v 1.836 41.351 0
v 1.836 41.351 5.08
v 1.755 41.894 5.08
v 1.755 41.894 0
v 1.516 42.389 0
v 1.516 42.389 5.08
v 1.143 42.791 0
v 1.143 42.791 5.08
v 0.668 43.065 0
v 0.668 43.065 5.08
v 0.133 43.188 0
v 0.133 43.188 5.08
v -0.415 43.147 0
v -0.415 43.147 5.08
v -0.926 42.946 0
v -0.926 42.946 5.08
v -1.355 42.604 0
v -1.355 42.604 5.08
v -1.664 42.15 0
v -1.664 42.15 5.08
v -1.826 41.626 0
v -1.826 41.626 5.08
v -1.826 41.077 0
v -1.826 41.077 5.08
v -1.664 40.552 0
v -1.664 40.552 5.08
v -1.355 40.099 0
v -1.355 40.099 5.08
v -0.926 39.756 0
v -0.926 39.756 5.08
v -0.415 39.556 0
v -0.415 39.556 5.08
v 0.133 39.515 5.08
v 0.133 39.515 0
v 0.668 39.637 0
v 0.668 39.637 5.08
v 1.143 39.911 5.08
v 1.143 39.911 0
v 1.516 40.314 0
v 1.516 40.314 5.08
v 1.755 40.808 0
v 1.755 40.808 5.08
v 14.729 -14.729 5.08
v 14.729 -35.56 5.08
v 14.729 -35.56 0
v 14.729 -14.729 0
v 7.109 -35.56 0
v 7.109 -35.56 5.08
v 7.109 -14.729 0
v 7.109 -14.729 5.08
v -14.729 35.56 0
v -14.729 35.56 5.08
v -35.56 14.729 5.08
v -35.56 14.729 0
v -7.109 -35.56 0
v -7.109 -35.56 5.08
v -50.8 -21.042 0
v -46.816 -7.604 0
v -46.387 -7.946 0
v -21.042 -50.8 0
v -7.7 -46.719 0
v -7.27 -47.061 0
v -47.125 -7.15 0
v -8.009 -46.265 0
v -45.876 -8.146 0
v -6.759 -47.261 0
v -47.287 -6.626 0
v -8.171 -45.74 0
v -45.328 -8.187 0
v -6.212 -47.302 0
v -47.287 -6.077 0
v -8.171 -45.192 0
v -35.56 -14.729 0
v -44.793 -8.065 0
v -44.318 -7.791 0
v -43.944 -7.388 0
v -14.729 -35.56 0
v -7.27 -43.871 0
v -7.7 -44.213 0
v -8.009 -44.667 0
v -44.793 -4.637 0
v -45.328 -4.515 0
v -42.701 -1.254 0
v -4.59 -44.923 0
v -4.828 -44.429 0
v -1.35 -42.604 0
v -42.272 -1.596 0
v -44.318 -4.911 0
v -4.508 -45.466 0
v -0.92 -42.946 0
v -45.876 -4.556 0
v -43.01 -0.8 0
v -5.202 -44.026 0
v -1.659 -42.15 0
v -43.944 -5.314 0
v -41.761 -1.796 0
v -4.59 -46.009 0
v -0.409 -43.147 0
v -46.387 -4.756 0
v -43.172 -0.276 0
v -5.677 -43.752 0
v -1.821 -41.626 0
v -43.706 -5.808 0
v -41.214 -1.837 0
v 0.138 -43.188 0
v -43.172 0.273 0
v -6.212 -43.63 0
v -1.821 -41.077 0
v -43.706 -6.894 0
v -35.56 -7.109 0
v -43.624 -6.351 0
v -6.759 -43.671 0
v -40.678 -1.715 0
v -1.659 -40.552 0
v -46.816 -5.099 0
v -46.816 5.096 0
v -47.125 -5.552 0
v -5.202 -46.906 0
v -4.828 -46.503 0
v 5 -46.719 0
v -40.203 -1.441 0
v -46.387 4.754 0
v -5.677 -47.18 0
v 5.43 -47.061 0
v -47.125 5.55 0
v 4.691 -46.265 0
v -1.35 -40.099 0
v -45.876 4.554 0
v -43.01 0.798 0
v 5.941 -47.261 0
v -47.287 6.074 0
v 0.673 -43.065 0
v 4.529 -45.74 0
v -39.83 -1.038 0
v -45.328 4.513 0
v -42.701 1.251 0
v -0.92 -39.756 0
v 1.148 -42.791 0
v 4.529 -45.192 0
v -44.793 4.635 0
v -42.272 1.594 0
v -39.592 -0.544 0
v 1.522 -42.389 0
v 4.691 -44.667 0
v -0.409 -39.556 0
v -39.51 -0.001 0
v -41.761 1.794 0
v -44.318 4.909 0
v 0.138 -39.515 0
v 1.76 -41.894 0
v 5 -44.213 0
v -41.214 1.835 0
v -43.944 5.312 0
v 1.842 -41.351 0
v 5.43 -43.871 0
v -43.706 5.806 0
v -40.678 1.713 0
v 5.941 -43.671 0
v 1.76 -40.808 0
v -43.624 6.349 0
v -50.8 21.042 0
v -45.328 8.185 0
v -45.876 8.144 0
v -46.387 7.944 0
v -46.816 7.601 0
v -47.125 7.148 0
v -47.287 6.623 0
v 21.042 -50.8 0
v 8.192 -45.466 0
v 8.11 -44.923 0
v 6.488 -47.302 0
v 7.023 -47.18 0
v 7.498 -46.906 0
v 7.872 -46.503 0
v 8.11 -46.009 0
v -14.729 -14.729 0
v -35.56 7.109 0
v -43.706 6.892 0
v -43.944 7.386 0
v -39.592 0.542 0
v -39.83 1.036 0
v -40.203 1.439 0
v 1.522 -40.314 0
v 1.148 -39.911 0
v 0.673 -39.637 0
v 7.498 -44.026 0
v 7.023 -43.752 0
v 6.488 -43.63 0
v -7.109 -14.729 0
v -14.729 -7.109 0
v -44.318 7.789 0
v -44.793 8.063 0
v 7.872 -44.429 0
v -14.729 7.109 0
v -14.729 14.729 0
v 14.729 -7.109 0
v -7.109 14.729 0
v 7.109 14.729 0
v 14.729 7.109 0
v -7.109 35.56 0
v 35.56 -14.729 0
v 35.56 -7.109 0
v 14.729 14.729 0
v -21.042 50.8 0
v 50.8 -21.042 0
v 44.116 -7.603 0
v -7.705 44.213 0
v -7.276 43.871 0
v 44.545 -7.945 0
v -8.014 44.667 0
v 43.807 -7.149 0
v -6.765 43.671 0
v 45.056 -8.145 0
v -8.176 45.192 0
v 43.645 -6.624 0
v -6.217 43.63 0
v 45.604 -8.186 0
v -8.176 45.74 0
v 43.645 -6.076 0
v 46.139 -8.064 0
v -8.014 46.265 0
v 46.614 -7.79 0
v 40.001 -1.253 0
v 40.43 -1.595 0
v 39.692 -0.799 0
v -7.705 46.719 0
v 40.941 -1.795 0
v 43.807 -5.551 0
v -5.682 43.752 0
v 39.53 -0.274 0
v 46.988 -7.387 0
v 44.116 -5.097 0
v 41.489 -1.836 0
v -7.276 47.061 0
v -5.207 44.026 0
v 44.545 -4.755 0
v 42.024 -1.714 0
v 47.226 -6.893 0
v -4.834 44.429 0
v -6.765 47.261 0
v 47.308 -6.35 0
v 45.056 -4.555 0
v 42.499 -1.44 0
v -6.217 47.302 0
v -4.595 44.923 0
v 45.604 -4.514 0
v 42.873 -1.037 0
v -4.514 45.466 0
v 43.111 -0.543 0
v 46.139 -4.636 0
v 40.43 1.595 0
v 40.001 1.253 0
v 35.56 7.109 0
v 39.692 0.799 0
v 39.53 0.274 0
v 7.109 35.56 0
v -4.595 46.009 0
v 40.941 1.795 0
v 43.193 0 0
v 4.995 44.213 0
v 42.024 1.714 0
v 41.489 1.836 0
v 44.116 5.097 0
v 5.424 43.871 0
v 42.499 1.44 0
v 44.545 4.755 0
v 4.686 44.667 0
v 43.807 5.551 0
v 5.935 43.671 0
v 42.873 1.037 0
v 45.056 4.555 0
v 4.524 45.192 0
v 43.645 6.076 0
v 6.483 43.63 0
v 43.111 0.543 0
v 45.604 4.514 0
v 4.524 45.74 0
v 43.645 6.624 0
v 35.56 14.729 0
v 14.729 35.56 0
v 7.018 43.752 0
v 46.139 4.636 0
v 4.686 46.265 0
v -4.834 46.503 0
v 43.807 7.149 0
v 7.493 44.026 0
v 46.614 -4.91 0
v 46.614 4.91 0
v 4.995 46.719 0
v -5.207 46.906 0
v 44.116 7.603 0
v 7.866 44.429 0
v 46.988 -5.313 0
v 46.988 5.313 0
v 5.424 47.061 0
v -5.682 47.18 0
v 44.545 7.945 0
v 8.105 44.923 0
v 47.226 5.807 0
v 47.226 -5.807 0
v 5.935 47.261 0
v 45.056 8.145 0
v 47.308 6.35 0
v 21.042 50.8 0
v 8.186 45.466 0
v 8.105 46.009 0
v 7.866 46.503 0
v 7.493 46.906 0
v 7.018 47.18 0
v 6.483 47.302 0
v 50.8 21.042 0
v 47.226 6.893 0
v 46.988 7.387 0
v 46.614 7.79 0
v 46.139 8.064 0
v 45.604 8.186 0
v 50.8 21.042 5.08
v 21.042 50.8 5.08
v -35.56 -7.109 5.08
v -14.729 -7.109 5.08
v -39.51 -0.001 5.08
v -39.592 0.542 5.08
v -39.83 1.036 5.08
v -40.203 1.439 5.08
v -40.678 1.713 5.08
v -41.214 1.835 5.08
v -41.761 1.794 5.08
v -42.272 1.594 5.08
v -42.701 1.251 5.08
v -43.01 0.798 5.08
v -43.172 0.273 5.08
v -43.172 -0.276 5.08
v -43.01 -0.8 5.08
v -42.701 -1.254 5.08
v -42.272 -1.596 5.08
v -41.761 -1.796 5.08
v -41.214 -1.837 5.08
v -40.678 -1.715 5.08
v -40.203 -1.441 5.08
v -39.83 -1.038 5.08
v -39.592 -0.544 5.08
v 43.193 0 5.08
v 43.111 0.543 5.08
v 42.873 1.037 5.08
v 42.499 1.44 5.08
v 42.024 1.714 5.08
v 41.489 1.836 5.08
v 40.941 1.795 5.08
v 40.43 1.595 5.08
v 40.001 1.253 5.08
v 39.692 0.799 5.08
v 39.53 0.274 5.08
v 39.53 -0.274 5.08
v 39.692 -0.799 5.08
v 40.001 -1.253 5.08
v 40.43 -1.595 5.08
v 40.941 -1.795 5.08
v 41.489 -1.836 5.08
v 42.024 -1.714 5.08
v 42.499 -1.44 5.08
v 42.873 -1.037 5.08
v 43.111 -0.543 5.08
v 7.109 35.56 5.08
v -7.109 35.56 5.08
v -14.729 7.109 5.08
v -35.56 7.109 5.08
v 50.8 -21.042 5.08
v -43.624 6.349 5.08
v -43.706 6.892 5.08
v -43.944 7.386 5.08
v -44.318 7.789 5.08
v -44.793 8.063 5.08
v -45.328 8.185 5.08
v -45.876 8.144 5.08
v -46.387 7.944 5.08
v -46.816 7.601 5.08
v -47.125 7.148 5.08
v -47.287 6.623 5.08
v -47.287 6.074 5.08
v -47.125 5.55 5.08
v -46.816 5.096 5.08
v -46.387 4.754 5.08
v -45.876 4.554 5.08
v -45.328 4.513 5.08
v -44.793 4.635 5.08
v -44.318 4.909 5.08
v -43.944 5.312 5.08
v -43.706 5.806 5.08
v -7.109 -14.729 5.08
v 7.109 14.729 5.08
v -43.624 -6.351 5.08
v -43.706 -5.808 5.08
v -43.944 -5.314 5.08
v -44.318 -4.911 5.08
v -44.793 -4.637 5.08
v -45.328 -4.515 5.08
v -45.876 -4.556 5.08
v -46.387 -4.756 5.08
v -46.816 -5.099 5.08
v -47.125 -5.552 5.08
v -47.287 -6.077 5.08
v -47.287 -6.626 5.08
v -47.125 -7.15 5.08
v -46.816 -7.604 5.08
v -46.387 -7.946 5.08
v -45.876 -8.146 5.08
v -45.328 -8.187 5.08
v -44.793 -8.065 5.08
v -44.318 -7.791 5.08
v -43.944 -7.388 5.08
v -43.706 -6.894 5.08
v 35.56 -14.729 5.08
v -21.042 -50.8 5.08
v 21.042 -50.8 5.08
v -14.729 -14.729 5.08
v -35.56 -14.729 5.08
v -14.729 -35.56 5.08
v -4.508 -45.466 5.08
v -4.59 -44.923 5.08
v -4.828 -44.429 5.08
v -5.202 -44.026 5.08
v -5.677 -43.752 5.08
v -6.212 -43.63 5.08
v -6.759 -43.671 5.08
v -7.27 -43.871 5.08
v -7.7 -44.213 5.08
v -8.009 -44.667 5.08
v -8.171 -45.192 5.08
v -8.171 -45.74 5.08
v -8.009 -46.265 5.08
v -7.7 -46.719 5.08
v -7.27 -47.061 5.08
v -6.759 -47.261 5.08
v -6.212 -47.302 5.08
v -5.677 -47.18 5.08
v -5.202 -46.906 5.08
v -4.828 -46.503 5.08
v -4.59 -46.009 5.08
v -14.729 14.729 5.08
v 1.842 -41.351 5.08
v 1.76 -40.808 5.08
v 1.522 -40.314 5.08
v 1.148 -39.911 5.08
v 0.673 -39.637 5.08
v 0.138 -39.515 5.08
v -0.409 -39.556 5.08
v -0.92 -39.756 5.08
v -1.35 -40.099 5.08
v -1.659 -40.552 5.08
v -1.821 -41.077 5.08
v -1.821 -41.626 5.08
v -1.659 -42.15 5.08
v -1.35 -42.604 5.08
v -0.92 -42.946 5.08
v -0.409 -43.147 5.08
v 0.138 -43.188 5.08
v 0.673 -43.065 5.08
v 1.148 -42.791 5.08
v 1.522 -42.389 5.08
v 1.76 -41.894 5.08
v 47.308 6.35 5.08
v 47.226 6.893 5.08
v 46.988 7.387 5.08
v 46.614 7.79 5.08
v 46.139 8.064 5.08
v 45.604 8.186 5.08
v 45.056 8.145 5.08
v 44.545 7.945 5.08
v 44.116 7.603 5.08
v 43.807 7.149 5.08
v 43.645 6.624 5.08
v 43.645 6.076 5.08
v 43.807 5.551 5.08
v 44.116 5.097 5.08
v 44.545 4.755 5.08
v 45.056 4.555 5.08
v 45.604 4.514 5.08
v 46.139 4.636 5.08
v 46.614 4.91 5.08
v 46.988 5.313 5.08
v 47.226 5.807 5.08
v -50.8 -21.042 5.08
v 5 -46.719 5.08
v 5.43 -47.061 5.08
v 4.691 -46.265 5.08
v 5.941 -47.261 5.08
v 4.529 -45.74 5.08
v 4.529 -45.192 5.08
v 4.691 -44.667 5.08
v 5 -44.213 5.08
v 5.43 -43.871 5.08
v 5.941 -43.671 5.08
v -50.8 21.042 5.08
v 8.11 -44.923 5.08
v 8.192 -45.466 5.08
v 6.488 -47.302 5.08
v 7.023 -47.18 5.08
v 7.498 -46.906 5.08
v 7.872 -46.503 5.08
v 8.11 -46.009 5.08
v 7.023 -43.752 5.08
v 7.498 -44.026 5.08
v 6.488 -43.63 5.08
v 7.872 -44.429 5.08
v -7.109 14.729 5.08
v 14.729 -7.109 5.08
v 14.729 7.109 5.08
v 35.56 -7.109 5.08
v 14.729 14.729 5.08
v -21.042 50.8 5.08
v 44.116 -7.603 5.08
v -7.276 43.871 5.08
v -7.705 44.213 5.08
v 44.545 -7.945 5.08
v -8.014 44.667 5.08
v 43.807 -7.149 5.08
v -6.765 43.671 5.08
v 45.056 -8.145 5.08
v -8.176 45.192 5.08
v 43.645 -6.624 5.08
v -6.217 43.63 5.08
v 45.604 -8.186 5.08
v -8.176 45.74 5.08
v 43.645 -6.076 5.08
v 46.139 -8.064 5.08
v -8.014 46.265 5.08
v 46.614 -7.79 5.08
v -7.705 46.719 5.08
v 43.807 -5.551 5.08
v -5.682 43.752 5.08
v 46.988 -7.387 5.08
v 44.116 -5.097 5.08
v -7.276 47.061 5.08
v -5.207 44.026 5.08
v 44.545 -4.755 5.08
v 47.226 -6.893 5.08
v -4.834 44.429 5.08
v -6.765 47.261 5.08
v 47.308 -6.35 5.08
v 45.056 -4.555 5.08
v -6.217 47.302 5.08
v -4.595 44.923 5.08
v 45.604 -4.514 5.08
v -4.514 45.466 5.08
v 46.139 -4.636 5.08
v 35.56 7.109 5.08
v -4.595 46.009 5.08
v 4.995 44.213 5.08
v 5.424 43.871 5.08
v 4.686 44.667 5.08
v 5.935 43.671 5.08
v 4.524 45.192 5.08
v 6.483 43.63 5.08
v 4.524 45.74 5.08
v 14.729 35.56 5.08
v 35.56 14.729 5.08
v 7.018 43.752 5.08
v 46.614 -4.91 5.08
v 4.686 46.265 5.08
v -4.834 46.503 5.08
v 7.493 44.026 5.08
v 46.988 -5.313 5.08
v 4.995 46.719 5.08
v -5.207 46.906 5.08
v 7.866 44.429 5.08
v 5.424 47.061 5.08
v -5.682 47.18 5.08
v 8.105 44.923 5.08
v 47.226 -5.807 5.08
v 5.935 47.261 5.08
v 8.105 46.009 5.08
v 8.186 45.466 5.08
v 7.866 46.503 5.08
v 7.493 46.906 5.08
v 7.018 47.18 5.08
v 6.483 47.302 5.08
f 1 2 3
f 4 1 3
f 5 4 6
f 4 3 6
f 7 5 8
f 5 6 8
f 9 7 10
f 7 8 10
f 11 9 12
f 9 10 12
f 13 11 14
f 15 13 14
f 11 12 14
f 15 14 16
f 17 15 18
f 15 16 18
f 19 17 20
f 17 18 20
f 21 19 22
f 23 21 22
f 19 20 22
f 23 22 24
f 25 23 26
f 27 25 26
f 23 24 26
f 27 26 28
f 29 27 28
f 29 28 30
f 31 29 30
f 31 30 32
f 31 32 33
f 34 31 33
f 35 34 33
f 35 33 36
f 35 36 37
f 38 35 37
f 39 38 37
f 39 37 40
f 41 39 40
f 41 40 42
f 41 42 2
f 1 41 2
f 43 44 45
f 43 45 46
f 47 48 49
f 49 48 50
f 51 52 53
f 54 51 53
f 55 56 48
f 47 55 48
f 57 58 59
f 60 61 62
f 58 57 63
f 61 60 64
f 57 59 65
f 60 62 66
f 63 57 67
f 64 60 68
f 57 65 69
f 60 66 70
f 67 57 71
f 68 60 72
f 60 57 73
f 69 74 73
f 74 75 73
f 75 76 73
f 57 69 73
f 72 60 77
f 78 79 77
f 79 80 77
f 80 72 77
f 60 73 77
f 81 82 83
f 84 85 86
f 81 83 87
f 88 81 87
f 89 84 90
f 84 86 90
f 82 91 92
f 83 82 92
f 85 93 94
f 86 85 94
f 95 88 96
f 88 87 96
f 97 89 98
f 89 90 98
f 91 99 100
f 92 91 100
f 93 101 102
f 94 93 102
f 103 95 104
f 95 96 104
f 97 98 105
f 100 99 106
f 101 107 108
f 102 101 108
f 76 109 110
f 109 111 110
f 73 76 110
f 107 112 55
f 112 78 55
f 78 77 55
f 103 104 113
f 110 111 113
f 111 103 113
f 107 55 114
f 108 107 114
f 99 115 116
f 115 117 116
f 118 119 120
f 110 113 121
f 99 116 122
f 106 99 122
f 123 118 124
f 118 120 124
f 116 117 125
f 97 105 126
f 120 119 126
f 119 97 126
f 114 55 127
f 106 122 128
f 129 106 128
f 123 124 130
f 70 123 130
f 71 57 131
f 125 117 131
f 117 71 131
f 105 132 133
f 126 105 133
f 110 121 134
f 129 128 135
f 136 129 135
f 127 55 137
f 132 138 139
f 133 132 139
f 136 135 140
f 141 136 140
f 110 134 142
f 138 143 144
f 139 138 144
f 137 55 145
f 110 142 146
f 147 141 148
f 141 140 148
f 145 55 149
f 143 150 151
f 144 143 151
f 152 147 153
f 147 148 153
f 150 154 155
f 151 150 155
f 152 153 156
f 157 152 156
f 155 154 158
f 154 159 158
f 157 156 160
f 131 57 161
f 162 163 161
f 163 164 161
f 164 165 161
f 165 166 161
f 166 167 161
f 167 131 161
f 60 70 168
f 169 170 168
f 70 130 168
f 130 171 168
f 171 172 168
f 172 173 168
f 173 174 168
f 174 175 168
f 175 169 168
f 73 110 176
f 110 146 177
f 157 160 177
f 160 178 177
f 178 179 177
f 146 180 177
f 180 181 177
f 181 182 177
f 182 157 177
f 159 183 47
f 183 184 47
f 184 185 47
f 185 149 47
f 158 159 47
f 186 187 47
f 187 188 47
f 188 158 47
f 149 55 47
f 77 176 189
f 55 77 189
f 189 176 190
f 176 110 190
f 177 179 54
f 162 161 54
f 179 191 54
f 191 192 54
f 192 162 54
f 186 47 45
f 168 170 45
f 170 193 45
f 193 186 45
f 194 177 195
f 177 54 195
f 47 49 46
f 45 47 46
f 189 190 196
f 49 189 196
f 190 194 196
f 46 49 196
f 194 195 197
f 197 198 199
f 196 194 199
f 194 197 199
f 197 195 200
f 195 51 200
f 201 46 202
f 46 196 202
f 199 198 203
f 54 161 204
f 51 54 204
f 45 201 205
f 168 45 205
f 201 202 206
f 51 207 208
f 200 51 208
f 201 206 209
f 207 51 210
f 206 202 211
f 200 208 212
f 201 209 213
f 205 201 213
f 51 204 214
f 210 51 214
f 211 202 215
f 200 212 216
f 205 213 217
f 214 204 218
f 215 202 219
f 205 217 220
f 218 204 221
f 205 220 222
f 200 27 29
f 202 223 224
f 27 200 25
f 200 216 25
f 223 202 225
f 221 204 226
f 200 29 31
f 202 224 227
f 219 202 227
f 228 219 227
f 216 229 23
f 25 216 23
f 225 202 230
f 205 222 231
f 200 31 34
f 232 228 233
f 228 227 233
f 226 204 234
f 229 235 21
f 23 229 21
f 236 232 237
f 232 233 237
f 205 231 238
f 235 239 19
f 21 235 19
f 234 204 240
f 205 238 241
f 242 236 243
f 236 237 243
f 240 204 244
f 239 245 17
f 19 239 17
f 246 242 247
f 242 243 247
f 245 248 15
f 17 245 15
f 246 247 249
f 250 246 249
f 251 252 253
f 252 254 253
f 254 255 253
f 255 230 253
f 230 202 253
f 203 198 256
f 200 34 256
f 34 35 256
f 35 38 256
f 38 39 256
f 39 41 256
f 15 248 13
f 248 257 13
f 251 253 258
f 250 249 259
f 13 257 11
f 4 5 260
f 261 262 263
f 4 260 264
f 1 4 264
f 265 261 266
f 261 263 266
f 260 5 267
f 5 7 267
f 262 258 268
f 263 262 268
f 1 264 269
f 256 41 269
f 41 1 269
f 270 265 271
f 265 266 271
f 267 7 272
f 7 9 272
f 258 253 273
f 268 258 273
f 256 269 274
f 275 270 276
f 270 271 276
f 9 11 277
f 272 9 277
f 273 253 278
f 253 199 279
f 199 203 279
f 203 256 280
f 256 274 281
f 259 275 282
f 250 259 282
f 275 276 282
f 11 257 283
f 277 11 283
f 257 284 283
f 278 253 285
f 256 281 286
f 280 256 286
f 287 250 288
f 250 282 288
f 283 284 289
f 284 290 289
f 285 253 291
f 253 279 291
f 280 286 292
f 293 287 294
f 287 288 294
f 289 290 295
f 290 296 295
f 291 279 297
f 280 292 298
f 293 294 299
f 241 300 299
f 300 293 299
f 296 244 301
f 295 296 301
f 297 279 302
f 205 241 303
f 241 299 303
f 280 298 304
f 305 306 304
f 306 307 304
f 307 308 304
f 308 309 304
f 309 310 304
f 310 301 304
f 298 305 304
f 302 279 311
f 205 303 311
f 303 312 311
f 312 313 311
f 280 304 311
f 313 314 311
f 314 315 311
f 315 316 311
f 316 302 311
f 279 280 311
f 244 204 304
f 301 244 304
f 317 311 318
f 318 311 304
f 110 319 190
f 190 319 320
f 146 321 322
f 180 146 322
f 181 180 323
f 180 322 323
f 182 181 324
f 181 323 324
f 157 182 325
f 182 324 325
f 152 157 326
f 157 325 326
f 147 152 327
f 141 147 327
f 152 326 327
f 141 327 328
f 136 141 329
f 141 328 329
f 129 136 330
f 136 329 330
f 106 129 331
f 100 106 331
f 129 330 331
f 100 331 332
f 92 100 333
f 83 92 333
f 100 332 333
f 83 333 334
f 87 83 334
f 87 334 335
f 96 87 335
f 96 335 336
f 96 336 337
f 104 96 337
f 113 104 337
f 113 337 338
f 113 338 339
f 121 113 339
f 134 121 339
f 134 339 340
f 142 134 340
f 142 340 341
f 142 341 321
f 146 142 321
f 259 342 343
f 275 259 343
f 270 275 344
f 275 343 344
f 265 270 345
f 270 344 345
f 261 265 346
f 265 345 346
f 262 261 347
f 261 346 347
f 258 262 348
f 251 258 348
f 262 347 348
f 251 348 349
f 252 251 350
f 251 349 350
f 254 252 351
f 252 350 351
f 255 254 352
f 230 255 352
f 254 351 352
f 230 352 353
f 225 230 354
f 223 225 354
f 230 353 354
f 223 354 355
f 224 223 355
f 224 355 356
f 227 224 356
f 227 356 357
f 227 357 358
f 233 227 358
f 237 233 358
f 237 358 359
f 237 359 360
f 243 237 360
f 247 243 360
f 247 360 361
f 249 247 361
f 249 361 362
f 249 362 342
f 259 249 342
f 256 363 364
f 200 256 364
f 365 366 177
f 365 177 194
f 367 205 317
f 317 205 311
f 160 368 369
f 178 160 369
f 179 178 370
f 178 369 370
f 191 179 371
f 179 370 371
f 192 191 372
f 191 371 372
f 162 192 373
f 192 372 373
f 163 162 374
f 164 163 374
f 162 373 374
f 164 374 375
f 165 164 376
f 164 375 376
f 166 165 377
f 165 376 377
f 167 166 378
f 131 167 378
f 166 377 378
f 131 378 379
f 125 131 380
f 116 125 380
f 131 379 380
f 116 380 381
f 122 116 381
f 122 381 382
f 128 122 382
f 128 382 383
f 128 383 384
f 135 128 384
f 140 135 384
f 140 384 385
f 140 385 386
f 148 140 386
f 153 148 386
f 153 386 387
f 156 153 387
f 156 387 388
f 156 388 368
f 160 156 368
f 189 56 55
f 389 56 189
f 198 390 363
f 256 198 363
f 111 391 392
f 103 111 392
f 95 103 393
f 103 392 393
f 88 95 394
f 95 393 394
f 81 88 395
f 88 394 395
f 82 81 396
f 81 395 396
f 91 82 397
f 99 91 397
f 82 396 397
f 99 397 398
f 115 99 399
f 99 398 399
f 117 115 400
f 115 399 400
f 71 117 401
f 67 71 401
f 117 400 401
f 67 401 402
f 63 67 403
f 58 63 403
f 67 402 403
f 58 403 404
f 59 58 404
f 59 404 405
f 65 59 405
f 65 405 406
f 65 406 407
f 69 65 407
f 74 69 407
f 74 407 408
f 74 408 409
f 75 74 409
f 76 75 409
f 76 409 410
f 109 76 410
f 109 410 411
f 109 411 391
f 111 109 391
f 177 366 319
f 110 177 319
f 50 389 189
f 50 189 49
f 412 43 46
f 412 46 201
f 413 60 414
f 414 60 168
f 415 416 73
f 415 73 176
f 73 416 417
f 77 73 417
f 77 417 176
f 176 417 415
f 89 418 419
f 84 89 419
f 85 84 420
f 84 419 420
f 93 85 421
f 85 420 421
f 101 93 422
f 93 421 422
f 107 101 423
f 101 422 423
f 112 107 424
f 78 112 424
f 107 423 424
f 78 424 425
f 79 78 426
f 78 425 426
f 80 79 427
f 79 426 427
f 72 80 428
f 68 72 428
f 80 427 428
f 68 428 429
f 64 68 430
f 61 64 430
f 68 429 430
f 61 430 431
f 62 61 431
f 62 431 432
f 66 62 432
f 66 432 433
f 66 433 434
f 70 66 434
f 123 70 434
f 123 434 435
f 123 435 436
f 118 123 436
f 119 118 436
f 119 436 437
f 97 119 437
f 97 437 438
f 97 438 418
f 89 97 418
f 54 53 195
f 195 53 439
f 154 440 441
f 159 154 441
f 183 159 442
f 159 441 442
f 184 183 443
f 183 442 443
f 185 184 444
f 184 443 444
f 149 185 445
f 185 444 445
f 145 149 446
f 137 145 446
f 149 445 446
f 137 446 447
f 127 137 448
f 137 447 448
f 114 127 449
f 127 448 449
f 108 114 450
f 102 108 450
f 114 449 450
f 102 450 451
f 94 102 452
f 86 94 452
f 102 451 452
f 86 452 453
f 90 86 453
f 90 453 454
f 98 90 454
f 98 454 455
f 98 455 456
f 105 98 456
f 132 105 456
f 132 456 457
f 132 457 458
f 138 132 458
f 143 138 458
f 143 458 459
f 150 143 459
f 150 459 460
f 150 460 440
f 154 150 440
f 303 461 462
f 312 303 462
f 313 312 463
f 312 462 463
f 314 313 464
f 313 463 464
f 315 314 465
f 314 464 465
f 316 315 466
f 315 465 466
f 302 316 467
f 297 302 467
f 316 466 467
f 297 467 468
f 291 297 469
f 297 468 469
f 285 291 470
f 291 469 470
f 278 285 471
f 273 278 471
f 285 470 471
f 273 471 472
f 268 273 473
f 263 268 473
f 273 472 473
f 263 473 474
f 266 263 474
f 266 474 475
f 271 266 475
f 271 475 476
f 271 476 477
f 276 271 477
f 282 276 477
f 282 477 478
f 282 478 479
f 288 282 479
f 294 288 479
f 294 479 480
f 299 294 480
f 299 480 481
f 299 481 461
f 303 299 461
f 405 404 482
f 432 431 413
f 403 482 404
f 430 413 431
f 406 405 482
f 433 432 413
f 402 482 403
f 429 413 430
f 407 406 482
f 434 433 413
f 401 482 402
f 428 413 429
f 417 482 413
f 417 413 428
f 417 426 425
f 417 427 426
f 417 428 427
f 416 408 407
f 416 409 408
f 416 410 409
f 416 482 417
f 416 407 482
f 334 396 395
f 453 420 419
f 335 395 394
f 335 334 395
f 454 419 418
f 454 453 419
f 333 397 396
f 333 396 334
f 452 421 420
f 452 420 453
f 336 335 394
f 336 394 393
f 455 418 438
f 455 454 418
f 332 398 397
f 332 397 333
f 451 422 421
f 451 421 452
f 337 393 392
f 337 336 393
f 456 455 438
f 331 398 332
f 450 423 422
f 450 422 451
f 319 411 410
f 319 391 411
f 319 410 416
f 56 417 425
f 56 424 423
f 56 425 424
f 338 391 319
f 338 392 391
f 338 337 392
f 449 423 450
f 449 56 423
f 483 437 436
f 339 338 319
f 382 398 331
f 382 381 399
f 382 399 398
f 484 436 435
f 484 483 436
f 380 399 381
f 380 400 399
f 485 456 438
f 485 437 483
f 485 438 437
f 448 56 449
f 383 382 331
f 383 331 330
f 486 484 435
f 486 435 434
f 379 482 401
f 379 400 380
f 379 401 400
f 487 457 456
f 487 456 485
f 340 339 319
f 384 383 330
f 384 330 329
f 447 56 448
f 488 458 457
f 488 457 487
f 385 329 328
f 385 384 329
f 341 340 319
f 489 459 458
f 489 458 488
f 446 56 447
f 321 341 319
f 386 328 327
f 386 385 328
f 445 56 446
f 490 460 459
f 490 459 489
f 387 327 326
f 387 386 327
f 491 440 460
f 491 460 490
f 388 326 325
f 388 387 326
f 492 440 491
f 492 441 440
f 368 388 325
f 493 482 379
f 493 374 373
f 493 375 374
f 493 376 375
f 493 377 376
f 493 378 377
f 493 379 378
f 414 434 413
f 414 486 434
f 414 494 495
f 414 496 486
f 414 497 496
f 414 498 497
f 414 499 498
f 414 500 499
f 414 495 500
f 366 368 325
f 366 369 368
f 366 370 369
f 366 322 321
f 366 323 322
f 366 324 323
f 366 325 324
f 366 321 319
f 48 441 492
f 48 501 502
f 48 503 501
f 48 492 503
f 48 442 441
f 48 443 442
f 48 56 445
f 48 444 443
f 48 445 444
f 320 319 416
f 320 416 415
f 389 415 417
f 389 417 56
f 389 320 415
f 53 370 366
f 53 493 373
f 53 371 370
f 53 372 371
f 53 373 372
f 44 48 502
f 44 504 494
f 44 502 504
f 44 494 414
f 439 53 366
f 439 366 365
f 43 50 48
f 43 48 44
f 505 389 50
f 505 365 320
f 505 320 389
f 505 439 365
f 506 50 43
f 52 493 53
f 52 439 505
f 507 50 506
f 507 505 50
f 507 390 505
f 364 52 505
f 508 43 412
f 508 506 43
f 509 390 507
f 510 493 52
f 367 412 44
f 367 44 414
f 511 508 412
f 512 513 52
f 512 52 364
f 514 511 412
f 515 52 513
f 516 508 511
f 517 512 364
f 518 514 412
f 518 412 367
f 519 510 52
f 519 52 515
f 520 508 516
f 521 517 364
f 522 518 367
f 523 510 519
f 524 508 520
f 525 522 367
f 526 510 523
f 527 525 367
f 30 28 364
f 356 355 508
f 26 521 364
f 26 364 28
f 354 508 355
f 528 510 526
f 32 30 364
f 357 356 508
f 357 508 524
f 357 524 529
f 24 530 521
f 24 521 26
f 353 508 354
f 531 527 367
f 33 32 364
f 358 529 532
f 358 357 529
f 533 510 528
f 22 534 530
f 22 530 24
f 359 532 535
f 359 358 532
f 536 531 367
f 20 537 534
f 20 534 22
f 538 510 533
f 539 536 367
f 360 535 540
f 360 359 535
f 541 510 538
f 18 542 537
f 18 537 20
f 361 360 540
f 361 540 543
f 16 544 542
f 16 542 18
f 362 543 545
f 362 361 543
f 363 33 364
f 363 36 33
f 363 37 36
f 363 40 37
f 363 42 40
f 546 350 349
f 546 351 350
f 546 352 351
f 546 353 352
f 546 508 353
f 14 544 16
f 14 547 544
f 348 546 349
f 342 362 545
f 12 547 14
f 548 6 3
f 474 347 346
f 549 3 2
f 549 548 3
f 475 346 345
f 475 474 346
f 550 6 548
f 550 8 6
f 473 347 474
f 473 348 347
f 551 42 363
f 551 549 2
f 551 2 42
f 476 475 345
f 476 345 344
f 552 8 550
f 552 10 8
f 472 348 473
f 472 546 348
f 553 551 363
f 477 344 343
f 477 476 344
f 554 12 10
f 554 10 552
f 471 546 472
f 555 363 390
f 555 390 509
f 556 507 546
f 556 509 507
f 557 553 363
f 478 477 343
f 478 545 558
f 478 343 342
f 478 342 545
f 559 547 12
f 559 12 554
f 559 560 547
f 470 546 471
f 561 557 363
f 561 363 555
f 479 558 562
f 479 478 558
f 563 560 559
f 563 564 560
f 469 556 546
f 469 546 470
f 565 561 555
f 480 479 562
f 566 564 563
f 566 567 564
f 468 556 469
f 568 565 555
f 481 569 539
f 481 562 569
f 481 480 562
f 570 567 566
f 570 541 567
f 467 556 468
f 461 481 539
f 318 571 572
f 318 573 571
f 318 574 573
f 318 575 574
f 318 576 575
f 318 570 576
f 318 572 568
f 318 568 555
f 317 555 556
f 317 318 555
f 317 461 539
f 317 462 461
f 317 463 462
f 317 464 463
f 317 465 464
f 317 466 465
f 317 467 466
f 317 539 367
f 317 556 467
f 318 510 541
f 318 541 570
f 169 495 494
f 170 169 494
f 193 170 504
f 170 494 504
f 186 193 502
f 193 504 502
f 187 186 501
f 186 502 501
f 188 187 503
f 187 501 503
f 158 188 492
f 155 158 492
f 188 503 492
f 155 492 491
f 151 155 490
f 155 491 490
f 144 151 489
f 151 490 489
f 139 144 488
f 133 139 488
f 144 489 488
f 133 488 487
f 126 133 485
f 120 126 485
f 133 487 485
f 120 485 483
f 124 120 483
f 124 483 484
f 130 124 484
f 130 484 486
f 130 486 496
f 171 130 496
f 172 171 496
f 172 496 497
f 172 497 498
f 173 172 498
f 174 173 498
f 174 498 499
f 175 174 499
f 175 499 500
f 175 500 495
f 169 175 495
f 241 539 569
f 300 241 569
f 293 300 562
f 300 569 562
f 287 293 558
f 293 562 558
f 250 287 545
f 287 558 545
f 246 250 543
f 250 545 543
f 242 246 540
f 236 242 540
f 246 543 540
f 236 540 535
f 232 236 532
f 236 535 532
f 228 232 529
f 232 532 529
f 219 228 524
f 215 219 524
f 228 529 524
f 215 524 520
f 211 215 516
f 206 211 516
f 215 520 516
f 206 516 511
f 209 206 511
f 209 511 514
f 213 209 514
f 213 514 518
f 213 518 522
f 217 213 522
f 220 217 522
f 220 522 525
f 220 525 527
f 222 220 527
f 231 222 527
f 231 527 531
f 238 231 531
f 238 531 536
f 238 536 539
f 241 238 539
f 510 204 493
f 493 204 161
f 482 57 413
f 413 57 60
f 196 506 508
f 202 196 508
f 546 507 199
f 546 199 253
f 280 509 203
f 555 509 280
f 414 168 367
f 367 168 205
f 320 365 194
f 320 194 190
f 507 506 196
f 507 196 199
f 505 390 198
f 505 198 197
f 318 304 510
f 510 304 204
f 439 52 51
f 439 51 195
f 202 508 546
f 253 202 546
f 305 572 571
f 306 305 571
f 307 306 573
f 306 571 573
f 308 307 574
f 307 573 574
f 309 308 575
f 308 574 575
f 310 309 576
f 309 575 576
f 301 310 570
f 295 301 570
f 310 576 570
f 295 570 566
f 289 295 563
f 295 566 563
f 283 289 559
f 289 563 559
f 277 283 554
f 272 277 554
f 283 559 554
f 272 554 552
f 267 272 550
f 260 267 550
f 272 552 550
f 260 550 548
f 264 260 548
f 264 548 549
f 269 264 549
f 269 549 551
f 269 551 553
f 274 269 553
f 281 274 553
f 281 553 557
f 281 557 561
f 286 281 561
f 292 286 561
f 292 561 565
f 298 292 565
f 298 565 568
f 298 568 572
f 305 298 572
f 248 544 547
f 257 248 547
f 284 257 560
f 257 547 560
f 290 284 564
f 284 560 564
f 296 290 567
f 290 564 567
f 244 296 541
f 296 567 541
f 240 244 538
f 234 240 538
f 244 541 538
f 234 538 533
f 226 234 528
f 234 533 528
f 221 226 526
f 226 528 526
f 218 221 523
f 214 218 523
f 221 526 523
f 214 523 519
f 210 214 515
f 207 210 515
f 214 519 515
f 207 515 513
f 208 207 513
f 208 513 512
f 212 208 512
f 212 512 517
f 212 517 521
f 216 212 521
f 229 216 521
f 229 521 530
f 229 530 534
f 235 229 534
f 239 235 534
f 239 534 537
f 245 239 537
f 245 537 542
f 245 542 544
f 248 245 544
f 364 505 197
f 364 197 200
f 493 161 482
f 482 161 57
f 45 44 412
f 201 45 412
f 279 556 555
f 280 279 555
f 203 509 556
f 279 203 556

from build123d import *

# Parameters (mm, degrees)
F1_DEPTH  = 5.08
F3_DEPTH  = 5.081
F4_W      = 7.62
F4_H      = 20.830565722
F4_H_2    = 7.62
F4_W_2    = 20.830565722
F4_W_3    = 14.218868556
F4_H_3    = 14.218868556
F5_DEPTH  = 5.08
F6_R      = 1.8415
F10_DEPTH = 5.081
F7_R      = 1.8415
F11_DEPTH = 5.081
F8_R      = 1.8415
F12_DEPTH = 5.081
F9_R      = 1.8415
F13_DEPTH = 5.081
F14_W     = 14.218868556
F14_H     = 14.218868556
F15_DEPTH = 5.08


with BuildPart() as f1:
    # F0 (on Top) → F1 (new body)
    with BuildSketch(Plane.XY):
        Polygon((21.0420489686, 50.8), (-21.0420489686, 50.8), (-50.8, 21.0420489686), (-50.8, -21.0420489686), (-21.0420489686, -50.8), (21.0420489686, -50.8), (50.8, -21.0420489686), (50.8, 21.0420489686), align=None)
    extrude(amount=F1_DEPTH)

    # F2 (on face) → F3 (cut, through all)
    with BuildSketch(Plane.XY.offset(5.08)):
        Polygon((14.729434278, 35.56), (-14.729434278, 35.56), (-35.56, 14.729434278), (-35.56, -14.729434278), (-14.729434278, -35.56), (14.729434278, -35.56), (35.56, -14.729434278), (35.56, 14.729434278), align=None)
    extrude(amount=-F3_DEPTH, mode=Mode.SUBTRACT)

    # F4 (on face) → F5 (join)
    with BuildSketch(Plane.XY.offset(5.08)):
        with Locations((-10.919434278, 25.144717139)):
            Rectangle(F4_W, F4_H)
        with Locations((-10.919434278, 10.919434278)):
            Rectangle(F4_W, F4_H_2)
        with Locations((-25.144717139, 10.919434278)):
            Rectangle(F4_W_2, F4_H_2)
        with Locations((0, 10.919434278)):
            Rectangle(F4_W_3, F4_H_2)
        with Locations((-10.919434278, 0)):
            Rectangle(F4_W, F4_H_3)
        with Locations((10.919434278, 10.919434278)):
            Rectangle(F4_W, F4_H_2)
        with Locations((10.919434278, 25.144717139)):
            Rectangle(F4_W, F4_H)
        with Locations((-10.919434278, -10.919434278)):
            Rectangle(F4_W, F4_H_2)
        with Locations((-25.144717139, -10.919434278)):
            Rectangle(F4_W_2, F4_H_2)
        with Locations((0, -10.919434278)):
            Rectangle(F4_W_3, F4_H_2)
        with Locations((10.919434278, 0)):
            Rectangle(F4_W, F4_H_3)
        with Locations((25.144717139, 10.919434278)):
            Rectangle(F4_W_2, F4_H_2)
        with Locations((-10.919434278, -25.144717139)):
            Rectangle(F4_W, F4_H)
        with Locations((10.919434278, -10.919434278)):
            Rectangle(F4_W, F4_H_2)
        with Locations((10.919434278, -25.144717139)):
            Rectangle(F4_W, F4_H)
        with Locations((25.144717139, -10.919434278)):
            Rectangle(F4_W_2, F4_H_2)
    extrude(amount=-F5_DEPTH)

    # F6 (on face) → F10 (cut, through all)
    with BuildSketch(Plane.XY.offset(5.08)):
        with Locations((45.466, 6.35)):
            Circle(F6_R)
        with Locations((45.466, -6.35)):
            Circle(F6_R)
        with Locations((41.3512, 0)):
            Circle(F6_R)
    extrude(amount=-F10_DEPTH, mode=Mode.SUBTRACT)

    # F7 (on face) → F11 (cut, through all)
    with BuildSketch(Plane.XY.offset(5.08)):
        with Locations((-6.3550683909, 45.466)):
            Circle(F7_R)
        with Locations((6.3449316091, 45.466)):
            Circle(F7_R)
        with Locations((-0.0050683909, 41.3512)):
            Circle(F7_R)
    extrude(amount=-F11_DEPTH, mode=Mode.SUBTRACT)

    # F8 (on face) → F12 (cut, through all)
    with BuildSketch(Plane.XY.offset(5.08)):
        with Locations((-45.466, -6.3510387499)):
            Circle(F8_R)
        with Locations((-45.466, 6.3489612501)):
            Circle(F8_R)
        with Locations((-41.3512, -0.0010387499)):
            Circle(F8_R)
    extrude(amount=-F12_DEPTH, mode=Mode.SUBTRACT)

    # F9 (on face) → F13 (cut, through all)
    with BuildSketch(Plane.XY.offset(5.08)):
        with Locations((6.3503286729, -45.466)):
            Circle(F9_R)
        with Locations((-6.3496713271, -45.466)):
            Circle(F9_R)
        with Locations((0.0003286729, -41.3512)):
            Circle(F9_R)
    extrude(amount=-F13_DEPTH, mode=Mode.SUBTRACT)

    # F14 (on face) → F15 (join)
    with BuildSketch(Plane.XY.offset(5.08)):
        Rectangle(F14_W, F14_H)
    extrude(amount=-F15_DEPTH)


solid = f1.part
